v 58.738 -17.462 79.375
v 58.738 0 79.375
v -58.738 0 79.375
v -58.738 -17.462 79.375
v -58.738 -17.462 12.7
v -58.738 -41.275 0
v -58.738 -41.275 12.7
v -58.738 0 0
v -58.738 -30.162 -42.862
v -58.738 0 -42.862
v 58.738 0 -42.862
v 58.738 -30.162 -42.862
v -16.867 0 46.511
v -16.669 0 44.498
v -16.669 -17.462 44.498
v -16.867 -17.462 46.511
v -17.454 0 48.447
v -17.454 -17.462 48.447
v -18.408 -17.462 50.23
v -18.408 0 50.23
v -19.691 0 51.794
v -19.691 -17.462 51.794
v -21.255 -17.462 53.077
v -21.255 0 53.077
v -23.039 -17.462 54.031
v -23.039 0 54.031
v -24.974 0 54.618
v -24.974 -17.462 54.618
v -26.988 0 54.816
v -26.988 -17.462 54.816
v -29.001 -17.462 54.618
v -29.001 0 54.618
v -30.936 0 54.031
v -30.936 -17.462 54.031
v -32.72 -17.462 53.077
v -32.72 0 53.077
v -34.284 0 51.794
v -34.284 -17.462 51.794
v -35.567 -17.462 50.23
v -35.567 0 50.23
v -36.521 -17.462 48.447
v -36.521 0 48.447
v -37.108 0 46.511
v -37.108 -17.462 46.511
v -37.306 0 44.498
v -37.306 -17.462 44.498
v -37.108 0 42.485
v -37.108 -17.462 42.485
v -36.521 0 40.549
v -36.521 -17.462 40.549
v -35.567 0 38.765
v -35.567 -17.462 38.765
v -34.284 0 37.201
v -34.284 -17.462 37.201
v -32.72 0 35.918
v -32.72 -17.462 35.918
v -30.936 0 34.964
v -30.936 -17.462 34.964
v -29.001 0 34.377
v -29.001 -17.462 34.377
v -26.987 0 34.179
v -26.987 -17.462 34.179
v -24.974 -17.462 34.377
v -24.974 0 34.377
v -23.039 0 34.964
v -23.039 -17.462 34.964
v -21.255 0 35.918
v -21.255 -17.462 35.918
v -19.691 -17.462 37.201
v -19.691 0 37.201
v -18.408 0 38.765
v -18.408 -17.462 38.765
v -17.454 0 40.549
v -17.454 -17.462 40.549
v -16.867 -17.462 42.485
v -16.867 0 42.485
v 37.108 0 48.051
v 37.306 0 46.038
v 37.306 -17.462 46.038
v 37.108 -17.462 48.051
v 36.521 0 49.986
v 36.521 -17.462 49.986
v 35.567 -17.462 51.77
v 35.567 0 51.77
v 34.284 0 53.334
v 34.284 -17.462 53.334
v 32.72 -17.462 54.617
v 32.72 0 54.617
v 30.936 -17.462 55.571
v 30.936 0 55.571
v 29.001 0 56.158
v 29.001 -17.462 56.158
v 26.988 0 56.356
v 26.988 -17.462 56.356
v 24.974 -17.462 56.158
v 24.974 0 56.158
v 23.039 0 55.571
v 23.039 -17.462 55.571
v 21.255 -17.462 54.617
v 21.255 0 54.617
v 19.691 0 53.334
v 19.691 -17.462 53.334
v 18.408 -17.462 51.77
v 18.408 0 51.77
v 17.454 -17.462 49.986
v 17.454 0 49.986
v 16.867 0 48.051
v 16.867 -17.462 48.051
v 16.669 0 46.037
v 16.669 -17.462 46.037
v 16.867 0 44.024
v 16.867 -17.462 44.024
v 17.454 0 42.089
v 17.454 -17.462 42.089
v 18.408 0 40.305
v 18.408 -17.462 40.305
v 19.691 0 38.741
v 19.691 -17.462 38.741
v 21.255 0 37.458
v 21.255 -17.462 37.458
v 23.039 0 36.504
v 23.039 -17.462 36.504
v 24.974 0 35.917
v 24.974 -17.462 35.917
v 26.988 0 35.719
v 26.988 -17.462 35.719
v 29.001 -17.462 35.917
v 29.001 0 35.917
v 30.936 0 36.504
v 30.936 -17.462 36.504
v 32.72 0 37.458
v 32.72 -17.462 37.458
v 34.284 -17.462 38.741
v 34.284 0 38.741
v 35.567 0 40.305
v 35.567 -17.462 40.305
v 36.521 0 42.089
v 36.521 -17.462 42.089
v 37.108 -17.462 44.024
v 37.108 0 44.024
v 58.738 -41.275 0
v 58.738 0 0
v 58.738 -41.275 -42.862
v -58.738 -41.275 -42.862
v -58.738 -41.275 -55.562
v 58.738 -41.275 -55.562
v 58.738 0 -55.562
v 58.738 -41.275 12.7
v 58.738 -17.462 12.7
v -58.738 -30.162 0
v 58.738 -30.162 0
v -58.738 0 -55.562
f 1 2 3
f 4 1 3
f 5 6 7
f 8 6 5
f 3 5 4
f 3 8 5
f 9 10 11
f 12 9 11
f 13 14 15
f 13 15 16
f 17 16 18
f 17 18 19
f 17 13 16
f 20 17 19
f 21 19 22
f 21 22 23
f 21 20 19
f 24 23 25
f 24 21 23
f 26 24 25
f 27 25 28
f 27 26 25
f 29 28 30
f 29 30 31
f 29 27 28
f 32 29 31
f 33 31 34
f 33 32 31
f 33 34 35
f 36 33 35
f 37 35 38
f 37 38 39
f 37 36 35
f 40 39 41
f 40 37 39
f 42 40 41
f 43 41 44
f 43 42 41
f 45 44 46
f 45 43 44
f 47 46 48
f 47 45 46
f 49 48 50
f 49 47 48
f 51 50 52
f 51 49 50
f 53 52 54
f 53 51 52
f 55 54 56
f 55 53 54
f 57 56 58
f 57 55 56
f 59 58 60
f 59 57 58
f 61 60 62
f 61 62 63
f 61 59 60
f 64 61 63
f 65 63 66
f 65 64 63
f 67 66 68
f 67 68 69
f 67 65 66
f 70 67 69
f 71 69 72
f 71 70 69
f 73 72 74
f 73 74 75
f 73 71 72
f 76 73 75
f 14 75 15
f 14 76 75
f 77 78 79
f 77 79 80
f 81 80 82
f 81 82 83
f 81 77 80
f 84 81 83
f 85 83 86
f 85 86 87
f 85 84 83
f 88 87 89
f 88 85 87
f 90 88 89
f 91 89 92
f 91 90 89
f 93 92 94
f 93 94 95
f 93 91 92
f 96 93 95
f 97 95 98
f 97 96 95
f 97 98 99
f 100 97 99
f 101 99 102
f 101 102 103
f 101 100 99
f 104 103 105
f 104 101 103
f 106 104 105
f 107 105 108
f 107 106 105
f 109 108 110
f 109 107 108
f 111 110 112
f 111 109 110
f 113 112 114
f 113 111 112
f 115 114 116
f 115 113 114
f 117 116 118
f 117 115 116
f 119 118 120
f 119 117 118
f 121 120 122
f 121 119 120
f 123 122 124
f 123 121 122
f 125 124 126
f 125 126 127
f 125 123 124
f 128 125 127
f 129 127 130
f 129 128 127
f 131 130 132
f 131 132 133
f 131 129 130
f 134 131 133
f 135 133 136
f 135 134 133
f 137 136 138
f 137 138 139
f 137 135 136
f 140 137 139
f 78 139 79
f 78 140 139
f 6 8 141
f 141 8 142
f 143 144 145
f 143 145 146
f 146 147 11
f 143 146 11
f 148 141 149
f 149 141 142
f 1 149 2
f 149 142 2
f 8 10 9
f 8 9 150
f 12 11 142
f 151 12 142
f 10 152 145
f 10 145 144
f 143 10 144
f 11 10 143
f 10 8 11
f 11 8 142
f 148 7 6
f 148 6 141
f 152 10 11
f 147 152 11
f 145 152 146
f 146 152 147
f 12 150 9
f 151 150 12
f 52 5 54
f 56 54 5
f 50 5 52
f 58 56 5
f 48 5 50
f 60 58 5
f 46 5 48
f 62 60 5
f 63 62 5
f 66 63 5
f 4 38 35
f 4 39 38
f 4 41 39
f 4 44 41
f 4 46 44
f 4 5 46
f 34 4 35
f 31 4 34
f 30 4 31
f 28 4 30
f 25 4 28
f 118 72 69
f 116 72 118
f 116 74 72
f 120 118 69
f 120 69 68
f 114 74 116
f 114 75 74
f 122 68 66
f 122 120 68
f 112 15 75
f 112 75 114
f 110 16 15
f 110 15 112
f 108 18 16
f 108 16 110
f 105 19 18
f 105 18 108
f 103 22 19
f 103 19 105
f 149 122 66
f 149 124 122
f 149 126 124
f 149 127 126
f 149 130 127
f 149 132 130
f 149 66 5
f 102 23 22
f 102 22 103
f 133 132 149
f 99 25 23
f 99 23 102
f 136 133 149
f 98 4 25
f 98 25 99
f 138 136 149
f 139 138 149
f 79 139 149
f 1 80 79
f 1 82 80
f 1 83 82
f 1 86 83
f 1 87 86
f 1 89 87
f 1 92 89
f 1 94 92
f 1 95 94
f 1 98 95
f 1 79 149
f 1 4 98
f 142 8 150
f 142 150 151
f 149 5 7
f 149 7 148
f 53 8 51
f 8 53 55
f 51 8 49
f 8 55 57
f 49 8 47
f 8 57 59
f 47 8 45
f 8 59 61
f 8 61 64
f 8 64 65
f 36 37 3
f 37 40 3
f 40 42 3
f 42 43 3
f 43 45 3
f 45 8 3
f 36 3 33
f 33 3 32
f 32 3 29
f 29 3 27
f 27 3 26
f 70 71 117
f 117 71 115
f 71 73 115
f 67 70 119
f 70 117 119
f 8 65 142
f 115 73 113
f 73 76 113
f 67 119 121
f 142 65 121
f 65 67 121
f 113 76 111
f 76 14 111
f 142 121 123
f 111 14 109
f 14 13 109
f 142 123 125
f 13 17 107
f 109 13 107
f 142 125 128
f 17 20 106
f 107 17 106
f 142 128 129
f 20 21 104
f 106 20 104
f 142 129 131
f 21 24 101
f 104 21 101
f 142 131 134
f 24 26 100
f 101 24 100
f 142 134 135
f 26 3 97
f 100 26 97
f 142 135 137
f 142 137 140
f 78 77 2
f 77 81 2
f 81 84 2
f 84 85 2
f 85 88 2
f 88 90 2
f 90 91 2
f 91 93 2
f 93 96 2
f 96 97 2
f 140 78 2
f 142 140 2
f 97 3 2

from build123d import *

# Parameters (mm, degrees)
F0_R     = 10.31875
F1_DEPTH = 17.4625
F0_W     = 117.475
F0_H     = 12.7
F2_DEPTH = 41.275
F0_H_2   = 42.8625
F3_DEPTH = 30.1625


with BuildPart() as f1:
    # F0 (on Front) → F1 (new body)
    with BuildSketch(Plane.XZ):
        Polygon((58.7375, 12.7), (58.7375, 79.375), (-4.7625, 79.375), (-58.7375, 79.375), (-58.7375, 12.7), align=None)
        with Locations((-26.9875, 44.497709)):
            Circle(F0_R, mode=Mode.SUBTRACT)
        with Locations((26.9875, 46.0375)):
            Circle(F0_R, mode=Mode.SUBTRACT)
    extrude(amount=F1_DEPTH)

    # F0 (on Front) → F2 (join)
    with BuildSketch(Plane.XZ):
        with Locations((0, 6.35)):
            Rectangle(F0_W, F0_H)
        with Locations((0, -49.2125)):
            Rectangle(F0_W, F0_H)
    extrude(amount=F2_DEPTH)


with BuildPart() as f3:
    # F0 (on Front) → F3 (new body)
    with BuildSketch(Plane.XZ):
        with Locations((0, -21.43125)):
            Rectangle(F0_W, F0_H_2)
    extrude(amount=F3_DEPTH)


solid = Compound([f1.part, f3.part])
